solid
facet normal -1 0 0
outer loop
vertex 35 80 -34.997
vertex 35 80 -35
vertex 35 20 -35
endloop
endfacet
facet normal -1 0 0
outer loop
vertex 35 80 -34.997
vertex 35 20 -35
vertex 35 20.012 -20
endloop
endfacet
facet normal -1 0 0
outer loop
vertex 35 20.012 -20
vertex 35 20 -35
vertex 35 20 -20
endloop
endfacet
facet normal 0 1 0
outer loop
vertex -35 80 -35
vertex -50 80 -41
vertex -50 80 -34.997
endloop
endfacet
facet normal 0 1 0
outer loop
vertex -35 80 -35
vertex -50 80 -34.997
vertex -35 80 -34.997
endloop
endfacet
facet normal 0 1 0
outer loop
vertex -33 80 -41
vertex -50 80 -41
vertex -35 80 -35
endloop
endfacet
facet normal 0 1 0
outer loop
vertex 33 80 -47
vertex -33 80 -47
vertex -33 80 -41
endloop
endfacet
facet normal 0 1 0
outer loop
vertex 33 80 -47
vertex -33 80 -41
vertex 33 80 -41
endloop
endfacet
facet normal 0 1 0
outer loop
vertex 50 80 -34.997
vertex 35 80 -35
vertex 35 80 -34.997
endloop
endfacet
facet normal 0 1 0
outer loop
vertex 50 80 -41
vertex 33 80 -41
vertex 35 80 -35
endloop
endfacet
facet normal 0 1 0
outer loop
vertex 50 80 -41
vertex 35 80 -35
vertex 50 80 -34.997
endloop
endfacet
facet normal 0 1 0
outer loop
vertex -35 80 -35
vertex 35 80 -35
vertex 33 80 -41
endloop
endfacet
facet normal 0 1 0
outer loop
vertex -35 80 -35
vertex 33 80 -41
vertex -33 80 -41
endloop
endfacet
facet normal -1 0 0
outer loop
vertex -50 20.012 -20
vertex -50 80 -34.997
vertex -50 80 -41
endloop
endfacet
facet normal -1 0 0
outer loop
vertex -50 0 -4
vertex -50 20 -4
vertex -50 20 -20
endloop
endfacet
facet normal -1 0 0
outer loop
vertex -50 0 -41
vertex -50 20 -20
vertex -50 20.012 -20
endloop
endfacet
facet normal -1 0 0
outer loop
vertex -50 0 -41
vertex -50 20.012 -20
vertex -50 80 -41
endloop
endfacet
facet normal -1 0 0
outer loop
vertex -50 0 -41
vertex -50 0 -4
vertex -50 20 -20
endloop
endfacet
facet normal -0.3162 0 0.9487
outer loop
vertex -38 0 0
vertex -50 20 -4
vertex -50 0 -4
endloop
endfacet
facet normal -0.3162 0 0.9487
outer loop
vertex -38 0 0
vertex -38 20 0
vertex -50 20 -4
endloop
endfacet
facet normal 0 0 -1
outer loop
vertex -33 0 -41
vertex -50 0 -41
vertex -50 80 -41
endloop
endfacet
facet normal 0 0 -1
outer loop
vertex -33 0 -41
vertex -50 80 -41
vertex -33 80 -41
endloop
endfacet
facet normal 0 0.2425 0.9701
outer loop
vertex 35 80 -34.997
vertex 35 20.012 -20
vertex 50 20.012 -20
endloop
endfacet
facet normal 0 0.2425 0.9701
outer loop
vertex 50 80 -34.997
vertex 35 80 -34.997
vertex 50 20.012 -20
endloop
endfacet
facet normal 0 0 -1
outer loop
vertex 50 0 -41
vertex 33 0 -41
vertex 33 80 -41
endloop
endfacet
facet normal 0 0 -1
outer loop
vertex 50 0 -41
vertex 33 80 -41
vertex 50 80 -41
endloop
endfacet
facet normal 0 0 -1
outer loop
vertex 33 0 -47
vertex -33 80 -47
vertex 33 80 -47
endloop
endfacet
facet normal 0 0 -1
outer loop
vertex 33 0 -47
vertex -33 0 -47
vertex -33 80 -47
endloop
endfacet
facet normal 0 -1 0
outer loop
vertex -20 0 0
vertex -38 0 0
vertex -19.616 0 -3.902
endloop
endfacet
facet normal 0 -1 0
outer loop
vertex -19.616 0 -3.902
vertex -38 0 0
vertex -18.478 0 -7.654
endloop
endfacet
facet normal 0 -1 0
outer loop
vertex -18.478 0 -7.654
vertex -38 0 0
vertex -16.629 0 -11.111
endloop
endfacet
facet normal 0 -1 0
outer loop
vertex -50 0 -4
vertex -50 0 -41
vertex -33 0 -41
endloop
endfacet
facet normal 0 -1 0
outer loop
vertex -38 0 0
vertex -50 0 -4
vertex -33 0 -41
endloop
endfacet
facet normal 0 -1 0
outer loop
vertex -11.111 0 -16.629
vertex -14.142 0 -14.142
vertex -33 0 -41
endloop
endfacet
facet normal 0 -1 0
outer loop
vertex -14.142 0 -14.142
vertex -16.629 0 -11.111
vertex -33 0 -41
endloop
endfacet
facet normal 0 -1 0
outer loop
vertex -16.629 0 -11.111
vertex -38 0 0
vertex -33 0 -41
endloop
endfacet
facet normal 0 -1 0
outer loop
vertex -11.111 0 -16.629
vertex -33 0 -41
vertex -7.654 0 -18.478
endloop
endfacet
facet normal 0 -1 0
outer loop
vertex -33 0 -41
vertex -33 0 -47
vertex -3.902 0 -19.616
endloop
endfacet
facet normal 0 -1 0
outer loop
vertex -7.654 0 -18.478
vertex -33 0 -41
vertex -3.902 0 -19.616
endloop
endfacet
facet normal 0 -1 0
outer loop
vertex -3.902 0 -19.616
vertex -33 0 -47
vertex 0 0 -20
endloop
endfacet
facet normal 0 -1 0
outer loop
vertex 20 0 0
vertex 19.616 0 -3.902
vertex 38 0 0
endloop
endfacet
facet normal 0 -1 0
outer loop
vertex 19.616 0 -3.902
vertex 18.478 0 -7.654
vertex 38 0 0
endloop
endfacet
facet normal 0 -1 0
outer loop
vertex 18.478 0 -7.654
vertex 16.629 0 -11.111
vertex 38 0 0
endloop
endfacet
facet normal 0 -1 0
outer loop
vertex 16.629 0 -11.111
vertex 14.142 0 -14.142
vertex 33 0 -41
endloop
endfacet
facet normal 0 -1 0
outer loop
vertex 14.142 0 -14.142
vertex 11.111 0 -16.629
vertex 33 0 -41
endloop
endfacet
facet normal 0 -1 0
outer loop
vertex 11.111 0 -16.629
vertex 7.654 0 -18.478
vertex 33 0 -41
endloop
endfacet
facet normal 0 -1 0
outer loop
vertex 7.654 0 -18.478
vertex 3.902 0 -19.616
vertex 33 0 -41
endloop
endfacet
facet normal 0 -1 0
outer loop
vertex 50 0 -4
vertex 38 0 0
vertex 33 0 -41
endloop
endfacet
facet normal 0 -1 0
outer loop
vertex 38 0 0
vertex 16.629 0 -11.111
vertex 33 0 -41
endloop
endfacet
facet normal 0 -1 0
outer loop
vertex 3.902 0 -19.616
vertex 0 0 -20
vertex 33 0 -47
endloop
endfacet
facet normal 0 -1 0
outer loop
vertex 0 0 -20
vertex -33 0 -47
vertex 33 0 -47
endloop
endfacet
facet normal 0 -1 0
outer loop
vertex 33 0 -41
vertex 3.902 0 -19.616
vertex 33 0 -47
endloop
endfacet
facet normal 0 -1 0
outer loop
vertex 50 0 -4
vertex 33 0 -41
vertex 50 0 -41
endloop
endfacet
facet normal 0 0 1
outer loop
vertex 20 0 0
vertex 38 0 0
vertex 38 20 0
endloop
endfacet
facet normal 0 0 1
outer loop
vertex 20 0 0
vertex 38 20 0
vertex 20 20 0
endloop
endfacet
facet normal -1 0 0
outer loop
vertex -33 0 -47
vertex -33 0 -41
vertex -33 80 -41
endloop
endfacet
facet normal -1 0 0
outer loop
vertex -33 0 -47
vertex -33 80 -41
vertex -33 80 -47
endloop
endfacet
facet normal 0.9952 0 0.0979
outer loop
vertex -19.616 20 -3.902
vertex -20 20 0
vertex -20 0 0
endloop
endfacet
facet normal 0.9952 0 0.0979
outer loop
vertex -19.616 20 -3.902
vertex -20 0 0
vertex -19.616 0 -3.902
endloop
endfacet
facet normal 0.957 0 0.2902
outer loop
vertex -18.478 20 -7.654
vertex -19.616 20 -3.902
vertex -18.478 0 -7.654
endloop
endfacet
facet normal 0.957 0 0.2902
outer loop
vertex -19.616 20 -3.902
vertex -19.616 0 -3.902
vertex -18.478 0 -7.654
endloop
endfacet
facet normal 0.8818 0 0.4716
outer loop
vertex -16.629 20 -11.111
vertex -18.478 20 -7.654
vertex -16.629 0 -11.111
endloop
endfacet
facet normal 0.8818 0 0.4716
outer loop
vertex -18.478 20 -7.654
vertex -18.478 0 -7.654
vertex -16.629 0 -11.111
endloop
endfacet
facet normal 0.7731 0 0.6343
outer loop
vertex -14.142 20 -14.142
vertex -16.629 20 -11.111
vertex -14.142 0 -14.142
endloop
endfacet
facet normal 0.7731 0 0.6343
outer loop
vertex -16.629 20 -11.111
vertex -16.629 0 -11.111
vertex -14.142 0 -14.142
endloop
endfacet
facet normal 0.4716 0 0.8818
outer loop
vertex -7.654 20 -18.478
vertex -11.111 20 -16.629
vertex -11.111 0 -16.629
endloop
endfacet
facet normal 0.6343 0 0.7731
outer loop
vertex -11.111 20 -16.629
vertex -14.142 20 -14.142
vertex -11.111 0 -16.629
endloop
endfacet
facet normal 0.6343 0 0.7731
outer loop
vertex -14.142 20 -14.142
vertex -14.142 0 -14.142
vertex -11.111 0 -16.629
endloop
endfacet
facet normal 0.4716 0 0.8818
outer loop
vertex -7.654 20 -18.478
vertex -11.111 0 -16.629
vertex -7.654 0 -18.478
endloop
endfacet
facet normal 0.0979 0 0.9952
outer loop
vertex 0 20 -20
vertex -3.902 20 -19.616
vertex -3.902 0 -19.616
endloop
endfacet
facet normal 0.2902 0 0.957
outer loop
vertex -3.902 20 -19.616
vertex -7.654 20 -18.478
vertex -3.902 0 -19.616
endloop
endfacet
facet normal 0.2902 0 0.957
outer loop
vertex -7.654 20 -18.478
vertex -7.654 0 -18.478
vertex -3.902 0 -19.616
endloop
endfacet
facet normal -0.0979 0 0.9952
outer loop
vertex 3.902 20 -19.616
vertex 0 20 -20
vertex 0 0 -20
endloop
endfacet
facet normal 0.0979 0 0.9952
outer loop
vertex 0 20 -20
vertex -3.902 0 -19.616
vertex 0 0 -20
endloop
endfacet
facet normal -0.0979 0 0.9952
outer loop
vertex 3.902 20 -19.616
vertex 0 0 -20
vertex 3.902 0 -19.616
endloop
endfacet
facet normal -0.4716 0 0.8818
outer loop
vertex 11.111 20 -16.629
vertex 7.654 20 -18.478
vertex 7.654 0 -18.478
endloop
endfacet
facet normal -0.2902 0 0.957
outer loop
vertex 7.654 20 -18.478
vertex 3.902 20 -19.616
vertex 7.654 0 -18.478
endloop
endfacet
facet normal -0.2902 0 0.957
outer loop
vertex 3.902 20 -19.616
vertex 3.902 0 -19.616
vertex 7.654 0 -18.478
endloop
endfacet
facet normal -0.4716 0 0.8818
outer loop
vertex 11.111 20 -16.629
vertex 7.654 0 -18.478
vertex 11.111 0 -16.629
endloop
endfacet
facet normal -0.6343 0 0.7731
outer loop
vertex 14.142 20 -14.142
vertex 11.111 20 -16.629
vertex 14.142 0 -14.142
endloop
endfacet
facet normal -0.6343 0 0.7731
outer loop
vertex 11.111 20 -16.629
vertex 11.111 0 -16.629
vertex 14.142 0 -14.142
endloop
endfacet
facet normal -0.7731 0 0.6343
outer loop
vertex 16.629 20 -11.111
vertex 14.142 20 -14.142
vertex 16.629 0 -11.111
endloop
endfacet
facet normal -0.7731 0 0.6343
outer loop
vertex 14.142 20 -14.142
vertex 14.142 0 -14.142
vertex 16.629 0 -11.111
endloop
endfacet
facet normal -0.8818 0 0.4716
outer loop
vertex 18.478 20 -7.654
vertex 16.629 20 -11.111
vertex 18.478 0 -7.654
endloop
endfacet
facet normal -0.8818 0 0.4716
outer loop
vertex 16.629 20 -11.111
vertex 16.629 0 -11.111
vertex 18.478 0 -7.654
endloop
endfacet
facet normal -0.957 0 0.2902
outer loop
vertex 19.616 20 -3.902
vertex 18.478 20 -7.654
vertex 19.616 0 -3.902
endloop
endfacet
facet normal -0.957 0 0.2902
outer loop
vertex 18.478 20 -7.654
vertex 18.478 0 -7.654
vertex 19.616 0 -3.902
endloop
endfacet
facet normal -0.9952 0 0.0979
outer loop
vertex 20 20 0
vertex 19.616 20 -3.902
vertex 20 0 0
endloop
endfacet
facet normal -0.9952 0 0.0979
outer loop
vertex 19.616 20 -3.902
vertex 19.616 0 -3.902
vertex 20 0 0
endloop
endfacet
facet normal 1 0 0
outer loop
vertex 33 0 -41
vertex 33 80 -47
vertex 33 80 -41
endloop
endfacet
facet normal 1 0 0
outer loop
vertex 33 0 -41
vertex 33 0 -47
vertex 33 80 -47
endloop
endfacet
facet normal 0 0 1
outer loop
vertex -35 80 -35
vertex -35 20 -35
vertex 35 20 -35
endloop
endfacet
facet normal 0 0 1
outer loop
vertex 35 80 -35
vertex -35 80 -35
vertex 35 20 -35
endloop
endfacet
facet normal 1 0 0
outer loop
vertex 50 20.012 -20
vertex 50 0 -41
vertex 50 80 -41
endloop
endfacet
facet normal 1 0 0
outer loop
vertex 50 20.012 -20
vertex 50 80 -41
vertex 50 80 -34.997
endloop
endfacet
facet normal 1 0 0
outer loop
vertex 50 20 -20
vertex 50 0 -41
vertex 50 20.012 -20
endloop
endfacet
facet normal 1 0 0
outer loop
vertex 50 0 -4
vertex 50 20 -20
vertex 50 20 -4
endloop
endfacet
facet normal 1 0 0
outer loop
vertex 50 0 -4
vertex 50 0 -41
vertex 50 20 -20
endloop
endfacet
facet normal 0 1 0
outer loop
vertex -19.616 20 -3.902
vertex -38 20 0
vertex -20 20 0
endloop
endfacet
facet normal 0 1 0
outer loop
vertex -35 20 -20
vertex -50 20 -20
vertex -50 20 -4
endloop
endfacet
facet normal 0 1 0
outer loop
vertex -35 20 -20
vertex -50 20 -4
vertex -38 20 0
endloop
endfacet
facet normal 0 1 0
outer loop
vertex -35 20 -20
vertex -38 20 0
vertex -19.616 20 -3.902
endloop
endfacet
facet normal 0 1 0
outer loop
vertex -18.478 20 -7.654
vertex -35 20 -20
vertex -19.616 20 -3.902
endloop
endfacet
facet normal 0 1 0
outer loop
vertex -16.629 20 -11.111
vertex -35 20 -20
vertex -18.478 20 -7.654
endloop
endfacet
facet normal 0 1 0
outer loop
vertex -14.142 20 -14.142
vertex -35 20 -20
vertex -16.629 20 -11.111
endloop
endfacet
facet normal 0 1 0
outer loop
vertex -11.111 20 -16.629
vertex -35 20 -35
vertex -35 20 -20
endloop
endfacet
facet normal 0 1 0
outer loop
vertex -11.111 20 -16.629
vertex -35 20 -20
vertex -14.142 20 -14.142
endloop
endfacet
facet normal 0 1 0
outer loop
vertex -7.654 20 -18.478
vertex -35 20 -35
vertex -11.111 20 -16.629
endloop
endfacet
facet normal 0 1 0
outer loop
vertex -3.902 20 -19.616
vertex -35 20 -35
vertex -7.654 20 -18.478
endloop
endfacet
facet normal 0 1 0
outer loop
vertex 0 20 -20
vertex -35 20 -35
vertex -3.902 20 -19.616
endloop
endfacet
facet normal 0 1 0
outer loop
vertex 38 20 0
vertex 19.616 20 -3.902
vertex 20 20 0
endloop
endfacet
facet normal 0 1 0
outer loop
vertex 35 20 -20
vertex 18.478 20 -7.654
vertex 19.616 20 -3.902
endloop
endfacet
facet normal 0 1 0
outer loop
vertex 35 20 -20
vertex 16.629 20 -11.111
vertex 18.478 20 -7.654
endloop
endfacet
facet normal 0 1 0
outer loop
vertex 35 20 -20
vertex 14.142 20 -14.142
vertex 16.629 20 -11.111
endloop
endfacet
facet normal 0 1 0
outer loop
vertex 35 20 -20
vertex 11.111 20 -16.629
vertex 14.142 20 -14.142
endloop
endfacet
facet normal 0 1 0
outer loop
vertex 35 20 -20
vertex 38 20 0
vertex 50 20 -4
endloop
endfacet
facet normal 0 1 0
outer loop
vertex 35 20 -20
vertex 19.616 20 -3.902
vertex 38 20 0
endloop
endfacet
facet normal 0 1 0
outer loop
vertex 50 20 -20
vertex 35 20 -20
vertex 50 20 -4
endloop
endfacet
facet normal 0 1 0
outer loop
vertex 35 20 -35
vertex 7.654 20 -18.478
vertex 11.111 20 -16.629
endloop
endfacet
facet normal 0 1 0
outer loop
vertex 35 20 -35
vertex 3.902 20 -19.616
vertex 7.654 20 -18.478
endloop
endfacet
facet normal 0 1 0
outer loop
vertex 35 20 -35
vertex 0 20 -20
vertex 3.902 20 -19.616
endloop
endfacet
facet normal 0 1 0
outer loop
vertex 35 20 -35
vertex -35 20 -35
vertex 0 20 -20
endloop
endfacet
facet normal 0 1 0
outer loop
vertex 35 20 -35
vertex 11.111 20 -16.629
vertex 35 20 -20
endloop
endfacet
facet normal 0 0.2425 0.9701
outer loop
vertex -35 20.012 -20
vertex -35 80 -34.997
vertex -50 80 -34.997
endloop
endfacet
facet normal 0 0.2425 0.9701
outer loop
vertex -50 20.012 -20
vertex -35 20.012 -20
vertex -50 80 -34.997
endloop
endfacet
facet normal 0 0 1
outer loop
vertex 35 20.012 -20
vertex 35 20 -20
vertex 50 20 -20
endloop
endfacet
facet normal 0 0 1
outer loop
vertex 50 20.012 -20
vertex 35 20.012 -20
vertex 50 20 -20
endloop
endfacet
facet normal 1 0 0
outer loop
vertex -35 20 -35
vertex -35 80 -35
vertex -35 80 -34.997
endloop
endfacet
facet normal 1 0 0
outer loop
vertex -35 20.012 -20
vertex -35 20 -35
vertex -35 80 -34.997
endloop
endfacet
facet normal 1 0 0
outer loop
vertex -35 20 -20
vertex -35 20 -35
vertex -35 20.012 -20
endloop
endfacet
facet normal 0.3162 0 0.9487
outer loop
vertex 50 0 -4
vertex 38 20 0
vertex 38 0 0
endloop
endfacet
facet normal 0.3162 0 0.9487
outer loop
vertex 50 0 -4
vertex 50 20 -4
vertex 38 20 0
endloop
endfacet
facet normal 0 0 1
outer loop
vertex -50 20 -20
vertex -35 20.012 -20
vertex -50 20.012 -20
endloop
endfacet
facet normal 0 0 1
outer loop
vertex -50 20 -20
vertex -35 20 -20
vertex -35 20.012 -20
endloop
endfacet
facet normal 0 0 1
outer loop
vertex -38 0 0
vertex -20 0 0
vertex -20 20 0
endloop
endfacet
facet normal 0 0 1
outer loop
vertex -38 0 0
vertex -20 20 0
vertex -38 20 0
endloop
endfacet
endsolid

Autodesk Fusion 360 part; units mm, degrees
sketch "Sketch1" plane through (0, 0, 0) normal (0, 1, 0) x (1, 0, 0)
  line L0 (-33, 47) -> (33, 47)
  line L1 (33, 47) -> (33, 41)
  line L2 (33, 41) -> (50, 41)
  line L3 (50, 41) -> (50, 0)
  line L4 (-50, 0) -> (-50, 41)
  line L5 (-50, 41) -> (-33, 41)
  line L6 (-33, 41) -> (-33, 47)
  arc A0 (20, 0) -> (-20, 0) centre (0, 0) ccw
  line L7 (50, 0) -> (20, 0)
  line L8 (-20, 0) -> (-50, 0)
  line L9 (50, 35) -> (35, 35)
  line L10 (35, 35) -> (35, 20)
  line L11 (35, 20) -> (50, 20)
  line L12 (50, 20) -> (50, 35)
  line L13 (-50, 35) -> (-35, 35)
  line L14 (-35, 35) -> (-35, 20)
  line L15 (-35, 20) -> (-50, 20)
  line L16 (-50, 20) -> (-50, 35)
  line L17 (-50, 35) -> (50, 35)
  dimension "d1" = 100
  dimension "d2" = 47
  dimension "d3" = 17
  dimension "d4" = 6
  dimension "d5" = 40
  dimension "d6" = 50
  dimension "d7" = 15
  dimension "d8" = 15
  dimension "d9" = 6
extrude "Extrude1" add sketch "Sketch1" along normal blind 80 contours L0 L1 L2 L3 L4 L5 L6 L9 L13 L17
extrude "Extrude2" add sketch "Sketch1" along normal blind 80 contours L4 L13 L14 L15 L16 L17 | L3 L9 L10 L11 L12 L17
extrude "Extrude3" add sketch "Sketch1" along normal blind 20 contours L3 L4 A0 L7 L8 L10 L11 L14 L15 L17
chamfer "Chamfer1" distance 12 distance2 4 1 edges at (50, 10, 0) measured on face at (40, 6.6667, 0)
chamfer "Chamfer2" distance 4 distance2 12 1 edges at (-50, 10, 0) measured on face at (-50, 33.3333, -34)
chamfer "Chamfer3" distance 15 distance2 60 2 edges at (42.5, 80, -20) (-42.5, 80, -20) measured on face at (45, 80, -32) measured on face at (45, 80, -32)
sketch "Sketch2" plane through (0, 0, -35) normal (0, 0, 1) x (-1, 0, 0)
  line L0 (35, -20) -> (-35, -20)
  line L1 (-35, -20) -> (-35, -80)
  line L2 (-35, -80) -> (35, -80)
  line L3 (35, -80) -> (35, -20)
  line L4 (20, -45) -> (-20, -45)
  arc A0 (-20, -45) -> (-20, -55) centre (-20, -50) ccw
  line L5 (-20, -55) -> (20, -55)
  arc A1 (20, -55) -> (20, -45) centre (20, -50) ccw
  line L6 (25, -50) -> (-25, -50) construction
  line L7 (50, -80) -> (50, -20)
  dimension "d22" = 5
  dimension "d23" = 30
  dimension "d24" = 40
  dimension "d25" = 30
extrude "Extrude4" cut sketch "Sketch2" along normal through all contours L4 A0 L5 A1
